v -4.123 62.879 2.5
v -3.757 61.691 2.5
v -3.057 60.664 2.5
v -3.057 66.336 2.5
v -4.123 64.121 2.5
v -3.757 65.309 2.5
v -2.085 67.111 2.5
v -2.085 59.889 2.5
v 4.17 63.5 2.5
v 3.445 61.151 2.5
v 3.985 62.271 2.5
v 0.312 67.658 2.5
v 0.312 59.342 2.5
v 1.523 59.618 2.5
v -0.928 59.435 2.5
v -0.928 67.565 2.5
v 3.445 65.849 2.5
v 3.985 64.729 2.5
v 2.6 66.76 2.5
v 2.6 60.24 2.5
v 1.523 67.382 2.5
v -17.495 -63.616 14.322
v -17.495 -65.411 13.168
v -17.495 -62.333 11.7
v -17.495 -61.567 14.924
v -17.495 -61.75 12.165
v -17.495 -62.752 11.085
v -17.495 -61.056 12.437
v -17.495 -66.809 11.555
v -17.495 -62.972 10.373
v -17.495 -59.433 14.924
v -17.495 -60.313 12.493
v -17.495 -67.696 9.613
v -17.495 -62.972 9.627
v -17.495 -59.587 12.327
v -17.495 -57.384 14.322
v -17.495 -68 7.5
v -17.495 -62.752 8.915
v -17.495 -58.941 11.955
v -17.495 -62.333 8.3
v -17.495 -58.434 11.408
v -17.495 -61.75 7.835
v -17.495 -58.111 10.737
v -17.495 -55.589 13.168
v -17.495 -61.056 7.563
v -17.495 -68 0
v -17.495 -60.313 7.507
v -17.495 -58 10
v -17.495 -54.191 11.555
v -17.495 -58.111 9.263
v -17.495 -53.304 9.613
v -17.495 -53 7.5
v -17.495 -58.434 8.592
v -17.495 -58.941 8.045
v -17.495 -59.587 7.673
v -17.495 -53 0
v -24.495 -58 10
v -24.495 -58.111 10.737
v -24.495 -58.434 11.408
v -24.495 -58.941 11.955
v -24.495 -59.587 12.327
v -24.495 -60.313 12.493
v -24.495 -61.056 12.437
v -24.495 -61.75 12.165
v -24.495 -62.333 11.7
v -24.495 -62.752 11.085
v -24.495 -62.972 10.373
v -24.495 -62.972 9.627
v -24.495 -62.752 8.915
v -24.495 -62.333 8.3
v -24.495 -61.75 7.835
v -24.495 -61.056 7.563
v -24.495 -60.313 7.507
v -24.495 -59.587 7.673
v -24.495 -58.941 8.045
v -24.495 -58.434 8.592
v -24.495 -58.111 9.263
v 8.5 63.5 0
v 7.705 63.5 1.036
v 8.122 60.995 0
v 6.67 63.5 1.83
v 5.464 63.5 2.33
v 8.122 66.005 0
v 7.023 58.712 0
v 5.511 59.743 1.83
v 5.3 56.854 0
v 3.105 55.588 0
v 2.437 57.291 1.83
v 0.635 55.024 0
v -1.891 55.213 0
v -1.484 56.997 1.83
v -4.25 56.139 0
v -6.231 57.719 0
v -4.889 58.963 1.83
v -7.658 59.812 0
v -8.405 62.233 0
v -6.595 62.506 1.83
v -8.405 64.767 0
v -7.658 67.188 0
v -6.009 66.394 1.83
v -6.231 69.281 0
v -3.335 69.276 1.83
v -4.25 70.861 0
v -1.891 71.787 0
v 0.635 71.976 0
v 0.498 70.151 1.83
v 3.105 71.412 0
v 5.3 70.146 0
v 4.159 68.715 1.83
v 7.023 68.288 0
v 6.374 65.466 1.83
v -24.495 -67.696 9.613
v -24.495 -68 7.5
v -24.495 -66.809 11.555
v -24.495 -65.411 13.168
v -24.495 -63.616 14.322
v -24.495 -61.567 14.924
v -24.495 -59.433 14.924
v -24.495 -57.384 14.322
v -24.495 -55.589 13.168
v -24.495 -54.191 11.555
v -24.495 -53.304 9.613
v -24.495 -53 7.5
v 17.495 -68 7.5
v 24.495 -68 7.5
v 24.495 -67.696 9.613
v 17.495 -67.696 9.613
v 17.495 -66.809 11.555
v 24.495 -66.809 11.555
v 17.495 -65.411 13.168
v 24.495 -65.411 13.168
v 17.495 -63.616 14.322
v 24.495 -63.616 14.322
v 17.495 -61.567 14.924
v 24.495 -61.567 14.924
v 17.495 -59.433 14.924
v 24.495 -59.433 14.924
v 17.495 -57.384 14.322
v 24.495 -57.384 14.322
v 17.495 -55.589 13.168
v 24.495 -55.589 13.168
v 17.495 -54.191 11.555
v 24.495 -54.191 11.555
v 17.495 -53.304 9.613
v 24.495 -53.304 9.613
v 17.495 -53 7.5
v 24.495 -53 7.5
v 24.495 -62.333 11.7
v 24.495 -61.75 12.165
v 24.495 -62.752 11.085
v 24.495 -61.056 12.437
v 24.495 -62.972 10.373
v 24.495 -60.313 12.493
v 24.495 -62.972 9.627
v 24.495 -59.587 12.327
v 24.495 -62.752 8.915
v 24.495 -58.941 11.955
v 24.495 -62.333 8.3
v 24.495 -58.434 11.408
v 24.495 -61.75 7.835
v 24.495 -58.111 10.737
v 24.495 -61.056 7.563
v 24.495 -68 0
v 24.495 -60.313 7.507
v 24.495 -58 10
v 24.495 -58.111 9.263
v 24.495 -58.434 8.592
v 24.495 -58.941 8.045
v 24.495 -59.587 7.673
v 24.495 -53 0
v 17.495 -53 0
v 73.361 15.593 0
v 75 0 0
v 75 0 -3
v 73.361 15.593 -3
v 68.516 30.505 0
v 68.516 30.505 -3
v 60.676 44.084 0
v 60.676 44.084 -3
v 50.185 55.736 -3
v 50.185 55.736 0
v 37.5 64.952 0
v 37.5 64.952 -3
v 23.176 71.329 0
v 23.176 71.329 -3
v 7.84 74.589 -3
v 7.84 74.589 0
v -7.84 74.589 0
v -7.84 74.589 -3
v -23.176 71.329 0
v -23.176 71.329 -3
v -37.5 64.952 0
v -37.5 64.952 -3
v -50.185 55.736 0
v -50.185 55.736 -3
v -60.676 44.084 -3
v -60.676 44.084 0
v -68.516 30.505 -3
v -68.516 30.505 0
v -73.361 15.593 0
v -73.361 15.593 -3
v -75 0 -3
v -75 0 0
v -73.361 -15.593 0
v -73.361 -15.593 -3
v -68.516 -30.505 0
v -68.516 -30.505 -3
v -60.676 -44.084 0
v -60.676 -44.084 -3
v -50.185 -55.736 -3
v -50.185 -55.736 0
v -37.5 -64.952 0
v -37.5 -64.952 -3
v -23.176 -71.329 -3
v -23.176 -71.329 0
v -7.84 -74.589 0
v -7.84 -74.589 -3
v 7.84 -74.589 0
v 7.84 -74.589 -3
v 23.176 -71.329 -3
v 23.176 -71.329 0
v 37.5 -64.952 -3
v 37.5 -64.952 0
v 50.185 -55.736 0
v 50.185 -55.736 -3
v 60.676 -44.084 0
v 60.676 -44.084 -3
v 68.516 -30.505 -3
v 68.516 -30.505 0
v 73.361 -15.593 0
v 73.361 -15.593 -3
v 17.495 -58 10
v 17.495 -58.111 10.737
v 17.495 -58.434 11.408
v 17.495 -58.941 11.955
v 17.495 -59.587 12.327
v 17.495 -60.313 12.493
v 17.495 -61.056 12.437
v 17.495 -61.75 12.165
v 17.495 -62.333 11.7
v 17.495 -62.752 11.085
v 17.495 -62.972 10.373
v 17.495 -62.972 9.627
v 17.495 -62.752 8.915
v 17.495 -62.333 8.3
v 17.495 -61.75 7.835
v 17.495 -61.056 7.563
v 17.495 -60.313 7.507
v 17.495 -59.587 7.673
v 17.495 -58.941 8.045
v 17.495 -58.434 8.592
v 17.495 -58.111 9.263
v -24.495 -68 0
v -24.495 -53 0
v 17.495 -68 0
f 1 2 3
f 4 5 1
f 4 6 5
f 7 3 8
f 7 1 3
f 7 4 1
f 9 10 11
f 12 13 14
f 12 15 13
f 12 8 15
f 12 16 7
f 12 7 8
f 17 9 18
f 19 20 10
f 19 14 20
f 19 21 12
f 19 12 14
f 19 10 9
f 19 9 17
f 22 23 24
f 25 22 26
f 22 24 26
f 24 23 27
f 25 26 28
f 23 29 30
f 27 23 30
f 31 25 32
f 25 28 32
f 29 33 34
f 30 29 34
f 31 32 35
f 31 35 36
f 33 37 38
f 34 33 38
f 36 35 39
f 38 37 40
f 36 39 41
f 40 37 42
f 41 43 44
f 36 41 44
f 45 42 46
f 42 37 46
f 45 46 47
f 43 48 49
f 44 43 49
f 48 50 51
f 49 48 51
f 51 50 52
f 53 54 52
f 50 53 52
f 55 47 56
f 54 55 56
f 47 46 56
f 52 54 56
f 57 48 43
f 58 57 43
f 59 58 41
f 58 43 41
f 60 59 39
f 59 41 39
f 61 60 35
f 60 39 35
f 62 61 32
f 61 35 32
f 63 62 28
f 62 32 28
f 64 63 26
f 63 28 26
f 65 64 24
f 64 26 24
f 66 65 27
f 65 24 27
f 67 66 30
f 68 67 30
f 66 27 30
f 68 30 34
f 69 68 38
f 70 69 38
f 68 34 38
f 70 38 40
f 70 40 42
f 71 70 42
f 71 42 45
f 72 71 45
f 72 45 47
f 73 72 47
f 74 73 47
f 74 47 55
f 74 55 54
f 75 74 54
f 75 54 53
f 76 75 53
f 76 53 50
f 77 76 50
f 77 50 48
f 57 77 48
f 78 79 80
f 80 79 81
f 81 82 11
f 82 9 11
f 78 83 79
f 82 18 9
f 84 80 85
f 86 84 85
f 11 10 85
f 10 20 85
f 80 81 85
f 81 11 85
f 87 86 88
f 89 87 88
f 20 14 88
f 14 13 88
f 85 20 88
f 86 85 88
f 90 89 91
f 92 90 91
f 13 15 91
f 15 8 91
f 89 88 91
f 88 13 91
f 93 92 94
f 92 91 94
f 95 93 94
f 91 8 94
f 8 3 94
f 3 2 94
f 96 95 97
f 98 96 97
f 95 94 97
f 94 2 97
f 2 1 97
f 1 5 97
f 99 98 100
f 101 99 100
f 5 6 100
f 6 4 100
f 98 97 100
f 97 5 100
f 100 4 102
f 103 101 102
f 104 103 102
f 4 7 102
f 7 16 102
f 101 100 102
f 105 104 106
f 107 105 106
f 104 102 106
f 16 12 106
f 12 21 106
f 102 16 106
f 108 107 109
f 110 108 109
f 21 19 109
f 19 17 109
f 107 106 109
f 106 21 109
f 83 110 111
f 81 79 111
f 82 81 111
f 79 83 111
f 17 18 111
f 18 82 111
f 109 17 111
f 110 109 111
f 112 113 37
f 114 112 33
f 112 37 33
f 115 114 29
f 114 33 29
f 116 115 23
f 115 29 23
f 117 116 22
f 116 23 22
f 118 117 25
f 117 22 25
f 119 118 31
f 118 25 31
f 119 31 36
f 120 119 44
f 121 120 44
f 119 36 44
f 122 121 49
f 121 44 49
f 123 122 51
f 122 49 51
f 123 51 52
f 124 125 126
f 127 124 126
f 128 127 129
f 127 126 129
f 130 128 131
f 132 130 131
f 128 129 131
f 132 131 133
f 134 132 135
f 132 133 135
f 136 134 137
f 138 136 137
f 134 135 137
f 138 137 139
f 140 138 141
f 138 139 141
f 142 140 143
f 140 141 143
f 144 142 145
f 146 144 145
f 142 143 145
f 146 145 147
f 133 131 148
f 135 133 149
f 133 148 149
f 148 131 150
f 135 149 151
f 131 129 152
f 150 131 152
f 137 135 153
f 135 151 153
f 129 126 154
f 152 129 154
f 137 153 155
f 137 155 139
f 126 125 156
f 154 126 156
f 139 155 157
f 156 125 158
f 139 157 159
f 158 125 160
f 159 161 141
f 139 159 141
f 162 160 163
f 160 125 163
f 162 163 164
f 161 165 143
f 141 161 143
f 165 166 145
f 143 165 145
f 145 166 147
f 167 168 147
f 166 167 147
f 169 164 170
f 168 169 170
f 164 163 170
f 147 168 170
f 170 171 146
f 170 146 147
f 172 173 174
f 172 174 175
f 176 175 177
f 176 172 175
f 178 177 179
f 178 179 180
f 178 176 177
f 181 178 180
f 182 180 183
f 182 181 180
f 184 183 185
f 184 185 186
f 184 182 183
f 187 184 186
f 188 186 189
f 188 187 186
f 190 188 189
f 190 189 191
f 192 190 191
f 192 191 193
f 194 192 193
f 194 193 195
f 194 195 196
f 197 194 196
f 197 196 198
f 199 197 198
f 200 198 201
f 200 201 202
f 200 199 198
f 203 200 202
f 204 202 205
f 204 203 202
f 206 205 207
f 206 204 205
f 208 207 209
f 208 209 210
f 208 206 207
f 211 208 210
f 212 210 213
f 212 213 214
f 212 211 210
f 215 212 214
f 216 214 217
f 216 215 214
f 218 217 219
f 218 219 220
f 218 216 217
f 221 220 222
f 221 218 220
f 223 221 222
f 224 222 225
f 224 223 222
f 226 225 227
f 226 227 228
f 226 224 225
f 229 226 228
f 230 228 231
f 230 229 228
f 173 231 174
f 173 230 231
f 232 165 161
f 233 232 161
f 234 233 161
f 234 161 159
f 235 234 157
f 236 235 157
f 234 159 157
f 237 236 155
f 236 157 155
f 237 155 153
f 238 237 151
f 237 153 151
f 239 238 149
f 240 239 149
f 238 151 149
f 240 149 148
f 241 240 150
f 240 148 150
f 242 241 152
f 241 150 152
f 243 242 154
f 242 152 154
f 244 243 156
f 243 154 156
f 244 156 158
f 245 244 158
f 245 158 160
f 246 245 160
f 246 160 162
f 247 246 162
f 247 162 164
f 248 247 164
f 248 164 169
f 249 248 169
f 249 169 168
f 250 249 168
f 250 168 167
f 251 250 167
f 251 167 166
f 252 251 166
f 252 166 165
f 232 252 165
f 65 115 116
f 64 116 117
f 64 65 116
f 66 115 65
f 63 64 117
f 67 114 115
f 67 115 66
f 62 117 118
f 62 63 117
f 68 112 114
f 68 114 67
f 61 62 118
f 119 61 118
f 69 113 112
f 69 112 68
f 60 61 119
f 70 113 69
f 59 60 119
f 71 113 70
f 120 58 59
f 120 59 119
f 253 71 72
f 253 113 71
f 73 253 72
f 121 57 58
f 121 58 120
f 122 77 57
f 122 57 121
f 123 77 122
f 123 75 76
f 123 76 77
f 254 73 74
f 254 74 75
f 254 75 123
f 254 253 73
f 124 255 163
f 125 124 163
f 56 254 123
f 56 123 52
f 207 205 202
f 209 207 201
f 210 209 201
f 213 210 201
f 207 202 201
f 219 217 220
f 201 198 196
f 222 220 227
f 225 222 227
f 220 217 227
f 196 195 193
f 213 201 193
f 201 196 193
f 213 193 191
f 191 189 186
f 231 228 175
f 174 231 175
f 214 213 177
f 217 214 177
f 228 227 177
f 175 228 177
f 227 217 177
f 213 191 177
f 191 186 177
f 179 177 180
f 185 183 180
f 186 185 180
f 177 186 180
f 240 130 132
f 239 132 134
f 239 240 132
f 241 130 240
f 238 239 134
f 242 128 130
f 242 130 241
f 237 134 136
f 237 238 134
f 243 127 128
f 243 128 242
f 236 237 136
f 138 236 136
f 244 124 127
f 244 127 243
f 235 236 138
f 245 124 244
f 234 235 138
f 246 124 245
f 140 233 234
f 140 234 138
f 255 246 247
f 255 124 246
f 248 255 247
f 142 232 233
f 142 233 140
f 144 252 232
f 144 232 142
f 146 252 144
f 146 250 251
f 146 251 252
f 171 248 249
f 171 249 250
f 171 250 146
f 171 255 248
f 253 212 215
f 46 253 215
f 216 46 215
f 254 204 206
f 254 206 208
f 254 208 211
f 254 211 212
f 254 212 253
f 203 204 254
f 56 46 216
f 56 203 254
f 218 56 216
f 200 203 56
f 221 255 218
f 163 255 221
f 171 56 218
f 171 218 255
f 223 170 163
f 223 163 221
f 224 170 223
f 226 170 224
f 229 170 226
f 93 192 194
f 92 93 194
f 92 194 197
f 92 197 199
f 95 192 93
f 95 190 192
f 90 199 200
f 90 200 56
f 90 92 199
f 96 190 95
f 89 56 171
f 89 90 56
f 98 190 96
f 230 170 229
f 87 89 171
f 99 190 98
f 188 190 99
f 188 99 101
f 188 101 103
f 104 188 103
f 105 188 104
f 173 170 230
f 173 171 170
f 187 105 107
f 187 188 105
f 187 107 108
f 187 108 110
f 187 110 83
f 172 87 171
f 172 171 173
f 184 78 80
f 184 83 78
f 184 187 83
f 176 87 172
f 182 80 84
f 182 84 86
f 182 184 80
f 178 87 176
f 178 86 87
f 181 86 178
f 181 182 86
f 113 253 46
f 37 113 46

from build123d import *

# Parameters (mm, degrees)
F0_R     = 75
F0_W     = 7
F0_H     = 15
F1_DEPTH = 3
F2_DEPTH = 15
F3_R     = 2.5
F4_DEPTH = 99.4959988723
F5_R     = 8.5
F6_DEPTH = 2.5
F6_TAPER = 10


# Not quite as in the source:
# - a fillet or chamfer that OpenCascade refuses, or shapes differently, is made with other operations: its cross-section is extruded or revolved along the edge and cut away or added


with BuildPart() as f1:
    # F0 (on Top) → F1 (new body)
    with BuildSketch(Plane.XY):
        Circle(F0_R)
        with Locations((-20.9949988723, -60.5)):
            Rectangle(F0_W, F0_H, mode=Mode.SUBTRACT)
        with Locations((20.9949988723, -60.5)):
            Rectangle(F0_W, F0_H, mode=Mode.SUBTRACT)
        with Locations((-20.9949988723, -60.5)):
            Rectangle(F0_W, F0_H)
        with Locations((20.9949988723, -60.5)):
            Rectangle(F0_W, F0_H)
    extrude(amount=-F1_DEPTH)

    # F0 (on Top) → F2 (join)
    with BuildSketch(Plane.XY):
        with Locations((20.9949988723, -60.5)):
            Rectangle(F0_W, F0_H)
        with Locations((-20.9949988723, -60.5)):
            Rectangle(F0_W, F0_H)
    extrude(amount=F2_DEPTH)

    # F3 (on face) → F4 (cut, through all)
    with BuildSketch(Plane.YZ.offset(24.4949988723)):
        with BuildLine():
            ThreePointArc((-68, 7.5), (-65.8033008589, 12.8033008589), (-60.5, 15))
            Line((-60.5, 15), (-68, 15))
            Line((-68, 15), (-68, 7.5))
        make_face()
        with BuildLine():
            ThreePointArc((-60.5, 15), (-55.1966991411, 12.8033008589), (-53, 7.5))
            Line((-53, 7.5), (-53, 15))
            Line((-53, 15), (-60.5, 15))
        make_face()
        with Locations((-60.5, 10)):
            Circle(F3_R)
    extrude(amount=-F4_DEPTH, mode=Mode.SUBTRACT)

    # F5 (on face) → F6 (join)
    with BuildSketch(Plane.XY):
        with Locations((0, 63.5)):
            Circle(F5_R)
    extrude(amount=F6_DEPTH, taper=F6_TAPER)

    # F7: fillet of radius 5 on 1 edges, made by hand

    # F7_s1 → F7_t2 (revolve, cut)
    with BuildSketch(Plane.XZ.offset(-63.5)):
        with BuildLine():
            ThreePointArc((8.5, 0), (6.6698729811, 1.8301270189), (4.1698729811, 2.5))
            Line((4.1698729811, 2.5), (8.0591825482, 2.5))
            Line((8.0591825482, 2.5), (8.5, 0))
        make_face()
    revolve(axis=Axis((0, 63.5, 2.5), (0, 0, -1)), mode=Mode.SUBTRACT)


solid = f1.part
